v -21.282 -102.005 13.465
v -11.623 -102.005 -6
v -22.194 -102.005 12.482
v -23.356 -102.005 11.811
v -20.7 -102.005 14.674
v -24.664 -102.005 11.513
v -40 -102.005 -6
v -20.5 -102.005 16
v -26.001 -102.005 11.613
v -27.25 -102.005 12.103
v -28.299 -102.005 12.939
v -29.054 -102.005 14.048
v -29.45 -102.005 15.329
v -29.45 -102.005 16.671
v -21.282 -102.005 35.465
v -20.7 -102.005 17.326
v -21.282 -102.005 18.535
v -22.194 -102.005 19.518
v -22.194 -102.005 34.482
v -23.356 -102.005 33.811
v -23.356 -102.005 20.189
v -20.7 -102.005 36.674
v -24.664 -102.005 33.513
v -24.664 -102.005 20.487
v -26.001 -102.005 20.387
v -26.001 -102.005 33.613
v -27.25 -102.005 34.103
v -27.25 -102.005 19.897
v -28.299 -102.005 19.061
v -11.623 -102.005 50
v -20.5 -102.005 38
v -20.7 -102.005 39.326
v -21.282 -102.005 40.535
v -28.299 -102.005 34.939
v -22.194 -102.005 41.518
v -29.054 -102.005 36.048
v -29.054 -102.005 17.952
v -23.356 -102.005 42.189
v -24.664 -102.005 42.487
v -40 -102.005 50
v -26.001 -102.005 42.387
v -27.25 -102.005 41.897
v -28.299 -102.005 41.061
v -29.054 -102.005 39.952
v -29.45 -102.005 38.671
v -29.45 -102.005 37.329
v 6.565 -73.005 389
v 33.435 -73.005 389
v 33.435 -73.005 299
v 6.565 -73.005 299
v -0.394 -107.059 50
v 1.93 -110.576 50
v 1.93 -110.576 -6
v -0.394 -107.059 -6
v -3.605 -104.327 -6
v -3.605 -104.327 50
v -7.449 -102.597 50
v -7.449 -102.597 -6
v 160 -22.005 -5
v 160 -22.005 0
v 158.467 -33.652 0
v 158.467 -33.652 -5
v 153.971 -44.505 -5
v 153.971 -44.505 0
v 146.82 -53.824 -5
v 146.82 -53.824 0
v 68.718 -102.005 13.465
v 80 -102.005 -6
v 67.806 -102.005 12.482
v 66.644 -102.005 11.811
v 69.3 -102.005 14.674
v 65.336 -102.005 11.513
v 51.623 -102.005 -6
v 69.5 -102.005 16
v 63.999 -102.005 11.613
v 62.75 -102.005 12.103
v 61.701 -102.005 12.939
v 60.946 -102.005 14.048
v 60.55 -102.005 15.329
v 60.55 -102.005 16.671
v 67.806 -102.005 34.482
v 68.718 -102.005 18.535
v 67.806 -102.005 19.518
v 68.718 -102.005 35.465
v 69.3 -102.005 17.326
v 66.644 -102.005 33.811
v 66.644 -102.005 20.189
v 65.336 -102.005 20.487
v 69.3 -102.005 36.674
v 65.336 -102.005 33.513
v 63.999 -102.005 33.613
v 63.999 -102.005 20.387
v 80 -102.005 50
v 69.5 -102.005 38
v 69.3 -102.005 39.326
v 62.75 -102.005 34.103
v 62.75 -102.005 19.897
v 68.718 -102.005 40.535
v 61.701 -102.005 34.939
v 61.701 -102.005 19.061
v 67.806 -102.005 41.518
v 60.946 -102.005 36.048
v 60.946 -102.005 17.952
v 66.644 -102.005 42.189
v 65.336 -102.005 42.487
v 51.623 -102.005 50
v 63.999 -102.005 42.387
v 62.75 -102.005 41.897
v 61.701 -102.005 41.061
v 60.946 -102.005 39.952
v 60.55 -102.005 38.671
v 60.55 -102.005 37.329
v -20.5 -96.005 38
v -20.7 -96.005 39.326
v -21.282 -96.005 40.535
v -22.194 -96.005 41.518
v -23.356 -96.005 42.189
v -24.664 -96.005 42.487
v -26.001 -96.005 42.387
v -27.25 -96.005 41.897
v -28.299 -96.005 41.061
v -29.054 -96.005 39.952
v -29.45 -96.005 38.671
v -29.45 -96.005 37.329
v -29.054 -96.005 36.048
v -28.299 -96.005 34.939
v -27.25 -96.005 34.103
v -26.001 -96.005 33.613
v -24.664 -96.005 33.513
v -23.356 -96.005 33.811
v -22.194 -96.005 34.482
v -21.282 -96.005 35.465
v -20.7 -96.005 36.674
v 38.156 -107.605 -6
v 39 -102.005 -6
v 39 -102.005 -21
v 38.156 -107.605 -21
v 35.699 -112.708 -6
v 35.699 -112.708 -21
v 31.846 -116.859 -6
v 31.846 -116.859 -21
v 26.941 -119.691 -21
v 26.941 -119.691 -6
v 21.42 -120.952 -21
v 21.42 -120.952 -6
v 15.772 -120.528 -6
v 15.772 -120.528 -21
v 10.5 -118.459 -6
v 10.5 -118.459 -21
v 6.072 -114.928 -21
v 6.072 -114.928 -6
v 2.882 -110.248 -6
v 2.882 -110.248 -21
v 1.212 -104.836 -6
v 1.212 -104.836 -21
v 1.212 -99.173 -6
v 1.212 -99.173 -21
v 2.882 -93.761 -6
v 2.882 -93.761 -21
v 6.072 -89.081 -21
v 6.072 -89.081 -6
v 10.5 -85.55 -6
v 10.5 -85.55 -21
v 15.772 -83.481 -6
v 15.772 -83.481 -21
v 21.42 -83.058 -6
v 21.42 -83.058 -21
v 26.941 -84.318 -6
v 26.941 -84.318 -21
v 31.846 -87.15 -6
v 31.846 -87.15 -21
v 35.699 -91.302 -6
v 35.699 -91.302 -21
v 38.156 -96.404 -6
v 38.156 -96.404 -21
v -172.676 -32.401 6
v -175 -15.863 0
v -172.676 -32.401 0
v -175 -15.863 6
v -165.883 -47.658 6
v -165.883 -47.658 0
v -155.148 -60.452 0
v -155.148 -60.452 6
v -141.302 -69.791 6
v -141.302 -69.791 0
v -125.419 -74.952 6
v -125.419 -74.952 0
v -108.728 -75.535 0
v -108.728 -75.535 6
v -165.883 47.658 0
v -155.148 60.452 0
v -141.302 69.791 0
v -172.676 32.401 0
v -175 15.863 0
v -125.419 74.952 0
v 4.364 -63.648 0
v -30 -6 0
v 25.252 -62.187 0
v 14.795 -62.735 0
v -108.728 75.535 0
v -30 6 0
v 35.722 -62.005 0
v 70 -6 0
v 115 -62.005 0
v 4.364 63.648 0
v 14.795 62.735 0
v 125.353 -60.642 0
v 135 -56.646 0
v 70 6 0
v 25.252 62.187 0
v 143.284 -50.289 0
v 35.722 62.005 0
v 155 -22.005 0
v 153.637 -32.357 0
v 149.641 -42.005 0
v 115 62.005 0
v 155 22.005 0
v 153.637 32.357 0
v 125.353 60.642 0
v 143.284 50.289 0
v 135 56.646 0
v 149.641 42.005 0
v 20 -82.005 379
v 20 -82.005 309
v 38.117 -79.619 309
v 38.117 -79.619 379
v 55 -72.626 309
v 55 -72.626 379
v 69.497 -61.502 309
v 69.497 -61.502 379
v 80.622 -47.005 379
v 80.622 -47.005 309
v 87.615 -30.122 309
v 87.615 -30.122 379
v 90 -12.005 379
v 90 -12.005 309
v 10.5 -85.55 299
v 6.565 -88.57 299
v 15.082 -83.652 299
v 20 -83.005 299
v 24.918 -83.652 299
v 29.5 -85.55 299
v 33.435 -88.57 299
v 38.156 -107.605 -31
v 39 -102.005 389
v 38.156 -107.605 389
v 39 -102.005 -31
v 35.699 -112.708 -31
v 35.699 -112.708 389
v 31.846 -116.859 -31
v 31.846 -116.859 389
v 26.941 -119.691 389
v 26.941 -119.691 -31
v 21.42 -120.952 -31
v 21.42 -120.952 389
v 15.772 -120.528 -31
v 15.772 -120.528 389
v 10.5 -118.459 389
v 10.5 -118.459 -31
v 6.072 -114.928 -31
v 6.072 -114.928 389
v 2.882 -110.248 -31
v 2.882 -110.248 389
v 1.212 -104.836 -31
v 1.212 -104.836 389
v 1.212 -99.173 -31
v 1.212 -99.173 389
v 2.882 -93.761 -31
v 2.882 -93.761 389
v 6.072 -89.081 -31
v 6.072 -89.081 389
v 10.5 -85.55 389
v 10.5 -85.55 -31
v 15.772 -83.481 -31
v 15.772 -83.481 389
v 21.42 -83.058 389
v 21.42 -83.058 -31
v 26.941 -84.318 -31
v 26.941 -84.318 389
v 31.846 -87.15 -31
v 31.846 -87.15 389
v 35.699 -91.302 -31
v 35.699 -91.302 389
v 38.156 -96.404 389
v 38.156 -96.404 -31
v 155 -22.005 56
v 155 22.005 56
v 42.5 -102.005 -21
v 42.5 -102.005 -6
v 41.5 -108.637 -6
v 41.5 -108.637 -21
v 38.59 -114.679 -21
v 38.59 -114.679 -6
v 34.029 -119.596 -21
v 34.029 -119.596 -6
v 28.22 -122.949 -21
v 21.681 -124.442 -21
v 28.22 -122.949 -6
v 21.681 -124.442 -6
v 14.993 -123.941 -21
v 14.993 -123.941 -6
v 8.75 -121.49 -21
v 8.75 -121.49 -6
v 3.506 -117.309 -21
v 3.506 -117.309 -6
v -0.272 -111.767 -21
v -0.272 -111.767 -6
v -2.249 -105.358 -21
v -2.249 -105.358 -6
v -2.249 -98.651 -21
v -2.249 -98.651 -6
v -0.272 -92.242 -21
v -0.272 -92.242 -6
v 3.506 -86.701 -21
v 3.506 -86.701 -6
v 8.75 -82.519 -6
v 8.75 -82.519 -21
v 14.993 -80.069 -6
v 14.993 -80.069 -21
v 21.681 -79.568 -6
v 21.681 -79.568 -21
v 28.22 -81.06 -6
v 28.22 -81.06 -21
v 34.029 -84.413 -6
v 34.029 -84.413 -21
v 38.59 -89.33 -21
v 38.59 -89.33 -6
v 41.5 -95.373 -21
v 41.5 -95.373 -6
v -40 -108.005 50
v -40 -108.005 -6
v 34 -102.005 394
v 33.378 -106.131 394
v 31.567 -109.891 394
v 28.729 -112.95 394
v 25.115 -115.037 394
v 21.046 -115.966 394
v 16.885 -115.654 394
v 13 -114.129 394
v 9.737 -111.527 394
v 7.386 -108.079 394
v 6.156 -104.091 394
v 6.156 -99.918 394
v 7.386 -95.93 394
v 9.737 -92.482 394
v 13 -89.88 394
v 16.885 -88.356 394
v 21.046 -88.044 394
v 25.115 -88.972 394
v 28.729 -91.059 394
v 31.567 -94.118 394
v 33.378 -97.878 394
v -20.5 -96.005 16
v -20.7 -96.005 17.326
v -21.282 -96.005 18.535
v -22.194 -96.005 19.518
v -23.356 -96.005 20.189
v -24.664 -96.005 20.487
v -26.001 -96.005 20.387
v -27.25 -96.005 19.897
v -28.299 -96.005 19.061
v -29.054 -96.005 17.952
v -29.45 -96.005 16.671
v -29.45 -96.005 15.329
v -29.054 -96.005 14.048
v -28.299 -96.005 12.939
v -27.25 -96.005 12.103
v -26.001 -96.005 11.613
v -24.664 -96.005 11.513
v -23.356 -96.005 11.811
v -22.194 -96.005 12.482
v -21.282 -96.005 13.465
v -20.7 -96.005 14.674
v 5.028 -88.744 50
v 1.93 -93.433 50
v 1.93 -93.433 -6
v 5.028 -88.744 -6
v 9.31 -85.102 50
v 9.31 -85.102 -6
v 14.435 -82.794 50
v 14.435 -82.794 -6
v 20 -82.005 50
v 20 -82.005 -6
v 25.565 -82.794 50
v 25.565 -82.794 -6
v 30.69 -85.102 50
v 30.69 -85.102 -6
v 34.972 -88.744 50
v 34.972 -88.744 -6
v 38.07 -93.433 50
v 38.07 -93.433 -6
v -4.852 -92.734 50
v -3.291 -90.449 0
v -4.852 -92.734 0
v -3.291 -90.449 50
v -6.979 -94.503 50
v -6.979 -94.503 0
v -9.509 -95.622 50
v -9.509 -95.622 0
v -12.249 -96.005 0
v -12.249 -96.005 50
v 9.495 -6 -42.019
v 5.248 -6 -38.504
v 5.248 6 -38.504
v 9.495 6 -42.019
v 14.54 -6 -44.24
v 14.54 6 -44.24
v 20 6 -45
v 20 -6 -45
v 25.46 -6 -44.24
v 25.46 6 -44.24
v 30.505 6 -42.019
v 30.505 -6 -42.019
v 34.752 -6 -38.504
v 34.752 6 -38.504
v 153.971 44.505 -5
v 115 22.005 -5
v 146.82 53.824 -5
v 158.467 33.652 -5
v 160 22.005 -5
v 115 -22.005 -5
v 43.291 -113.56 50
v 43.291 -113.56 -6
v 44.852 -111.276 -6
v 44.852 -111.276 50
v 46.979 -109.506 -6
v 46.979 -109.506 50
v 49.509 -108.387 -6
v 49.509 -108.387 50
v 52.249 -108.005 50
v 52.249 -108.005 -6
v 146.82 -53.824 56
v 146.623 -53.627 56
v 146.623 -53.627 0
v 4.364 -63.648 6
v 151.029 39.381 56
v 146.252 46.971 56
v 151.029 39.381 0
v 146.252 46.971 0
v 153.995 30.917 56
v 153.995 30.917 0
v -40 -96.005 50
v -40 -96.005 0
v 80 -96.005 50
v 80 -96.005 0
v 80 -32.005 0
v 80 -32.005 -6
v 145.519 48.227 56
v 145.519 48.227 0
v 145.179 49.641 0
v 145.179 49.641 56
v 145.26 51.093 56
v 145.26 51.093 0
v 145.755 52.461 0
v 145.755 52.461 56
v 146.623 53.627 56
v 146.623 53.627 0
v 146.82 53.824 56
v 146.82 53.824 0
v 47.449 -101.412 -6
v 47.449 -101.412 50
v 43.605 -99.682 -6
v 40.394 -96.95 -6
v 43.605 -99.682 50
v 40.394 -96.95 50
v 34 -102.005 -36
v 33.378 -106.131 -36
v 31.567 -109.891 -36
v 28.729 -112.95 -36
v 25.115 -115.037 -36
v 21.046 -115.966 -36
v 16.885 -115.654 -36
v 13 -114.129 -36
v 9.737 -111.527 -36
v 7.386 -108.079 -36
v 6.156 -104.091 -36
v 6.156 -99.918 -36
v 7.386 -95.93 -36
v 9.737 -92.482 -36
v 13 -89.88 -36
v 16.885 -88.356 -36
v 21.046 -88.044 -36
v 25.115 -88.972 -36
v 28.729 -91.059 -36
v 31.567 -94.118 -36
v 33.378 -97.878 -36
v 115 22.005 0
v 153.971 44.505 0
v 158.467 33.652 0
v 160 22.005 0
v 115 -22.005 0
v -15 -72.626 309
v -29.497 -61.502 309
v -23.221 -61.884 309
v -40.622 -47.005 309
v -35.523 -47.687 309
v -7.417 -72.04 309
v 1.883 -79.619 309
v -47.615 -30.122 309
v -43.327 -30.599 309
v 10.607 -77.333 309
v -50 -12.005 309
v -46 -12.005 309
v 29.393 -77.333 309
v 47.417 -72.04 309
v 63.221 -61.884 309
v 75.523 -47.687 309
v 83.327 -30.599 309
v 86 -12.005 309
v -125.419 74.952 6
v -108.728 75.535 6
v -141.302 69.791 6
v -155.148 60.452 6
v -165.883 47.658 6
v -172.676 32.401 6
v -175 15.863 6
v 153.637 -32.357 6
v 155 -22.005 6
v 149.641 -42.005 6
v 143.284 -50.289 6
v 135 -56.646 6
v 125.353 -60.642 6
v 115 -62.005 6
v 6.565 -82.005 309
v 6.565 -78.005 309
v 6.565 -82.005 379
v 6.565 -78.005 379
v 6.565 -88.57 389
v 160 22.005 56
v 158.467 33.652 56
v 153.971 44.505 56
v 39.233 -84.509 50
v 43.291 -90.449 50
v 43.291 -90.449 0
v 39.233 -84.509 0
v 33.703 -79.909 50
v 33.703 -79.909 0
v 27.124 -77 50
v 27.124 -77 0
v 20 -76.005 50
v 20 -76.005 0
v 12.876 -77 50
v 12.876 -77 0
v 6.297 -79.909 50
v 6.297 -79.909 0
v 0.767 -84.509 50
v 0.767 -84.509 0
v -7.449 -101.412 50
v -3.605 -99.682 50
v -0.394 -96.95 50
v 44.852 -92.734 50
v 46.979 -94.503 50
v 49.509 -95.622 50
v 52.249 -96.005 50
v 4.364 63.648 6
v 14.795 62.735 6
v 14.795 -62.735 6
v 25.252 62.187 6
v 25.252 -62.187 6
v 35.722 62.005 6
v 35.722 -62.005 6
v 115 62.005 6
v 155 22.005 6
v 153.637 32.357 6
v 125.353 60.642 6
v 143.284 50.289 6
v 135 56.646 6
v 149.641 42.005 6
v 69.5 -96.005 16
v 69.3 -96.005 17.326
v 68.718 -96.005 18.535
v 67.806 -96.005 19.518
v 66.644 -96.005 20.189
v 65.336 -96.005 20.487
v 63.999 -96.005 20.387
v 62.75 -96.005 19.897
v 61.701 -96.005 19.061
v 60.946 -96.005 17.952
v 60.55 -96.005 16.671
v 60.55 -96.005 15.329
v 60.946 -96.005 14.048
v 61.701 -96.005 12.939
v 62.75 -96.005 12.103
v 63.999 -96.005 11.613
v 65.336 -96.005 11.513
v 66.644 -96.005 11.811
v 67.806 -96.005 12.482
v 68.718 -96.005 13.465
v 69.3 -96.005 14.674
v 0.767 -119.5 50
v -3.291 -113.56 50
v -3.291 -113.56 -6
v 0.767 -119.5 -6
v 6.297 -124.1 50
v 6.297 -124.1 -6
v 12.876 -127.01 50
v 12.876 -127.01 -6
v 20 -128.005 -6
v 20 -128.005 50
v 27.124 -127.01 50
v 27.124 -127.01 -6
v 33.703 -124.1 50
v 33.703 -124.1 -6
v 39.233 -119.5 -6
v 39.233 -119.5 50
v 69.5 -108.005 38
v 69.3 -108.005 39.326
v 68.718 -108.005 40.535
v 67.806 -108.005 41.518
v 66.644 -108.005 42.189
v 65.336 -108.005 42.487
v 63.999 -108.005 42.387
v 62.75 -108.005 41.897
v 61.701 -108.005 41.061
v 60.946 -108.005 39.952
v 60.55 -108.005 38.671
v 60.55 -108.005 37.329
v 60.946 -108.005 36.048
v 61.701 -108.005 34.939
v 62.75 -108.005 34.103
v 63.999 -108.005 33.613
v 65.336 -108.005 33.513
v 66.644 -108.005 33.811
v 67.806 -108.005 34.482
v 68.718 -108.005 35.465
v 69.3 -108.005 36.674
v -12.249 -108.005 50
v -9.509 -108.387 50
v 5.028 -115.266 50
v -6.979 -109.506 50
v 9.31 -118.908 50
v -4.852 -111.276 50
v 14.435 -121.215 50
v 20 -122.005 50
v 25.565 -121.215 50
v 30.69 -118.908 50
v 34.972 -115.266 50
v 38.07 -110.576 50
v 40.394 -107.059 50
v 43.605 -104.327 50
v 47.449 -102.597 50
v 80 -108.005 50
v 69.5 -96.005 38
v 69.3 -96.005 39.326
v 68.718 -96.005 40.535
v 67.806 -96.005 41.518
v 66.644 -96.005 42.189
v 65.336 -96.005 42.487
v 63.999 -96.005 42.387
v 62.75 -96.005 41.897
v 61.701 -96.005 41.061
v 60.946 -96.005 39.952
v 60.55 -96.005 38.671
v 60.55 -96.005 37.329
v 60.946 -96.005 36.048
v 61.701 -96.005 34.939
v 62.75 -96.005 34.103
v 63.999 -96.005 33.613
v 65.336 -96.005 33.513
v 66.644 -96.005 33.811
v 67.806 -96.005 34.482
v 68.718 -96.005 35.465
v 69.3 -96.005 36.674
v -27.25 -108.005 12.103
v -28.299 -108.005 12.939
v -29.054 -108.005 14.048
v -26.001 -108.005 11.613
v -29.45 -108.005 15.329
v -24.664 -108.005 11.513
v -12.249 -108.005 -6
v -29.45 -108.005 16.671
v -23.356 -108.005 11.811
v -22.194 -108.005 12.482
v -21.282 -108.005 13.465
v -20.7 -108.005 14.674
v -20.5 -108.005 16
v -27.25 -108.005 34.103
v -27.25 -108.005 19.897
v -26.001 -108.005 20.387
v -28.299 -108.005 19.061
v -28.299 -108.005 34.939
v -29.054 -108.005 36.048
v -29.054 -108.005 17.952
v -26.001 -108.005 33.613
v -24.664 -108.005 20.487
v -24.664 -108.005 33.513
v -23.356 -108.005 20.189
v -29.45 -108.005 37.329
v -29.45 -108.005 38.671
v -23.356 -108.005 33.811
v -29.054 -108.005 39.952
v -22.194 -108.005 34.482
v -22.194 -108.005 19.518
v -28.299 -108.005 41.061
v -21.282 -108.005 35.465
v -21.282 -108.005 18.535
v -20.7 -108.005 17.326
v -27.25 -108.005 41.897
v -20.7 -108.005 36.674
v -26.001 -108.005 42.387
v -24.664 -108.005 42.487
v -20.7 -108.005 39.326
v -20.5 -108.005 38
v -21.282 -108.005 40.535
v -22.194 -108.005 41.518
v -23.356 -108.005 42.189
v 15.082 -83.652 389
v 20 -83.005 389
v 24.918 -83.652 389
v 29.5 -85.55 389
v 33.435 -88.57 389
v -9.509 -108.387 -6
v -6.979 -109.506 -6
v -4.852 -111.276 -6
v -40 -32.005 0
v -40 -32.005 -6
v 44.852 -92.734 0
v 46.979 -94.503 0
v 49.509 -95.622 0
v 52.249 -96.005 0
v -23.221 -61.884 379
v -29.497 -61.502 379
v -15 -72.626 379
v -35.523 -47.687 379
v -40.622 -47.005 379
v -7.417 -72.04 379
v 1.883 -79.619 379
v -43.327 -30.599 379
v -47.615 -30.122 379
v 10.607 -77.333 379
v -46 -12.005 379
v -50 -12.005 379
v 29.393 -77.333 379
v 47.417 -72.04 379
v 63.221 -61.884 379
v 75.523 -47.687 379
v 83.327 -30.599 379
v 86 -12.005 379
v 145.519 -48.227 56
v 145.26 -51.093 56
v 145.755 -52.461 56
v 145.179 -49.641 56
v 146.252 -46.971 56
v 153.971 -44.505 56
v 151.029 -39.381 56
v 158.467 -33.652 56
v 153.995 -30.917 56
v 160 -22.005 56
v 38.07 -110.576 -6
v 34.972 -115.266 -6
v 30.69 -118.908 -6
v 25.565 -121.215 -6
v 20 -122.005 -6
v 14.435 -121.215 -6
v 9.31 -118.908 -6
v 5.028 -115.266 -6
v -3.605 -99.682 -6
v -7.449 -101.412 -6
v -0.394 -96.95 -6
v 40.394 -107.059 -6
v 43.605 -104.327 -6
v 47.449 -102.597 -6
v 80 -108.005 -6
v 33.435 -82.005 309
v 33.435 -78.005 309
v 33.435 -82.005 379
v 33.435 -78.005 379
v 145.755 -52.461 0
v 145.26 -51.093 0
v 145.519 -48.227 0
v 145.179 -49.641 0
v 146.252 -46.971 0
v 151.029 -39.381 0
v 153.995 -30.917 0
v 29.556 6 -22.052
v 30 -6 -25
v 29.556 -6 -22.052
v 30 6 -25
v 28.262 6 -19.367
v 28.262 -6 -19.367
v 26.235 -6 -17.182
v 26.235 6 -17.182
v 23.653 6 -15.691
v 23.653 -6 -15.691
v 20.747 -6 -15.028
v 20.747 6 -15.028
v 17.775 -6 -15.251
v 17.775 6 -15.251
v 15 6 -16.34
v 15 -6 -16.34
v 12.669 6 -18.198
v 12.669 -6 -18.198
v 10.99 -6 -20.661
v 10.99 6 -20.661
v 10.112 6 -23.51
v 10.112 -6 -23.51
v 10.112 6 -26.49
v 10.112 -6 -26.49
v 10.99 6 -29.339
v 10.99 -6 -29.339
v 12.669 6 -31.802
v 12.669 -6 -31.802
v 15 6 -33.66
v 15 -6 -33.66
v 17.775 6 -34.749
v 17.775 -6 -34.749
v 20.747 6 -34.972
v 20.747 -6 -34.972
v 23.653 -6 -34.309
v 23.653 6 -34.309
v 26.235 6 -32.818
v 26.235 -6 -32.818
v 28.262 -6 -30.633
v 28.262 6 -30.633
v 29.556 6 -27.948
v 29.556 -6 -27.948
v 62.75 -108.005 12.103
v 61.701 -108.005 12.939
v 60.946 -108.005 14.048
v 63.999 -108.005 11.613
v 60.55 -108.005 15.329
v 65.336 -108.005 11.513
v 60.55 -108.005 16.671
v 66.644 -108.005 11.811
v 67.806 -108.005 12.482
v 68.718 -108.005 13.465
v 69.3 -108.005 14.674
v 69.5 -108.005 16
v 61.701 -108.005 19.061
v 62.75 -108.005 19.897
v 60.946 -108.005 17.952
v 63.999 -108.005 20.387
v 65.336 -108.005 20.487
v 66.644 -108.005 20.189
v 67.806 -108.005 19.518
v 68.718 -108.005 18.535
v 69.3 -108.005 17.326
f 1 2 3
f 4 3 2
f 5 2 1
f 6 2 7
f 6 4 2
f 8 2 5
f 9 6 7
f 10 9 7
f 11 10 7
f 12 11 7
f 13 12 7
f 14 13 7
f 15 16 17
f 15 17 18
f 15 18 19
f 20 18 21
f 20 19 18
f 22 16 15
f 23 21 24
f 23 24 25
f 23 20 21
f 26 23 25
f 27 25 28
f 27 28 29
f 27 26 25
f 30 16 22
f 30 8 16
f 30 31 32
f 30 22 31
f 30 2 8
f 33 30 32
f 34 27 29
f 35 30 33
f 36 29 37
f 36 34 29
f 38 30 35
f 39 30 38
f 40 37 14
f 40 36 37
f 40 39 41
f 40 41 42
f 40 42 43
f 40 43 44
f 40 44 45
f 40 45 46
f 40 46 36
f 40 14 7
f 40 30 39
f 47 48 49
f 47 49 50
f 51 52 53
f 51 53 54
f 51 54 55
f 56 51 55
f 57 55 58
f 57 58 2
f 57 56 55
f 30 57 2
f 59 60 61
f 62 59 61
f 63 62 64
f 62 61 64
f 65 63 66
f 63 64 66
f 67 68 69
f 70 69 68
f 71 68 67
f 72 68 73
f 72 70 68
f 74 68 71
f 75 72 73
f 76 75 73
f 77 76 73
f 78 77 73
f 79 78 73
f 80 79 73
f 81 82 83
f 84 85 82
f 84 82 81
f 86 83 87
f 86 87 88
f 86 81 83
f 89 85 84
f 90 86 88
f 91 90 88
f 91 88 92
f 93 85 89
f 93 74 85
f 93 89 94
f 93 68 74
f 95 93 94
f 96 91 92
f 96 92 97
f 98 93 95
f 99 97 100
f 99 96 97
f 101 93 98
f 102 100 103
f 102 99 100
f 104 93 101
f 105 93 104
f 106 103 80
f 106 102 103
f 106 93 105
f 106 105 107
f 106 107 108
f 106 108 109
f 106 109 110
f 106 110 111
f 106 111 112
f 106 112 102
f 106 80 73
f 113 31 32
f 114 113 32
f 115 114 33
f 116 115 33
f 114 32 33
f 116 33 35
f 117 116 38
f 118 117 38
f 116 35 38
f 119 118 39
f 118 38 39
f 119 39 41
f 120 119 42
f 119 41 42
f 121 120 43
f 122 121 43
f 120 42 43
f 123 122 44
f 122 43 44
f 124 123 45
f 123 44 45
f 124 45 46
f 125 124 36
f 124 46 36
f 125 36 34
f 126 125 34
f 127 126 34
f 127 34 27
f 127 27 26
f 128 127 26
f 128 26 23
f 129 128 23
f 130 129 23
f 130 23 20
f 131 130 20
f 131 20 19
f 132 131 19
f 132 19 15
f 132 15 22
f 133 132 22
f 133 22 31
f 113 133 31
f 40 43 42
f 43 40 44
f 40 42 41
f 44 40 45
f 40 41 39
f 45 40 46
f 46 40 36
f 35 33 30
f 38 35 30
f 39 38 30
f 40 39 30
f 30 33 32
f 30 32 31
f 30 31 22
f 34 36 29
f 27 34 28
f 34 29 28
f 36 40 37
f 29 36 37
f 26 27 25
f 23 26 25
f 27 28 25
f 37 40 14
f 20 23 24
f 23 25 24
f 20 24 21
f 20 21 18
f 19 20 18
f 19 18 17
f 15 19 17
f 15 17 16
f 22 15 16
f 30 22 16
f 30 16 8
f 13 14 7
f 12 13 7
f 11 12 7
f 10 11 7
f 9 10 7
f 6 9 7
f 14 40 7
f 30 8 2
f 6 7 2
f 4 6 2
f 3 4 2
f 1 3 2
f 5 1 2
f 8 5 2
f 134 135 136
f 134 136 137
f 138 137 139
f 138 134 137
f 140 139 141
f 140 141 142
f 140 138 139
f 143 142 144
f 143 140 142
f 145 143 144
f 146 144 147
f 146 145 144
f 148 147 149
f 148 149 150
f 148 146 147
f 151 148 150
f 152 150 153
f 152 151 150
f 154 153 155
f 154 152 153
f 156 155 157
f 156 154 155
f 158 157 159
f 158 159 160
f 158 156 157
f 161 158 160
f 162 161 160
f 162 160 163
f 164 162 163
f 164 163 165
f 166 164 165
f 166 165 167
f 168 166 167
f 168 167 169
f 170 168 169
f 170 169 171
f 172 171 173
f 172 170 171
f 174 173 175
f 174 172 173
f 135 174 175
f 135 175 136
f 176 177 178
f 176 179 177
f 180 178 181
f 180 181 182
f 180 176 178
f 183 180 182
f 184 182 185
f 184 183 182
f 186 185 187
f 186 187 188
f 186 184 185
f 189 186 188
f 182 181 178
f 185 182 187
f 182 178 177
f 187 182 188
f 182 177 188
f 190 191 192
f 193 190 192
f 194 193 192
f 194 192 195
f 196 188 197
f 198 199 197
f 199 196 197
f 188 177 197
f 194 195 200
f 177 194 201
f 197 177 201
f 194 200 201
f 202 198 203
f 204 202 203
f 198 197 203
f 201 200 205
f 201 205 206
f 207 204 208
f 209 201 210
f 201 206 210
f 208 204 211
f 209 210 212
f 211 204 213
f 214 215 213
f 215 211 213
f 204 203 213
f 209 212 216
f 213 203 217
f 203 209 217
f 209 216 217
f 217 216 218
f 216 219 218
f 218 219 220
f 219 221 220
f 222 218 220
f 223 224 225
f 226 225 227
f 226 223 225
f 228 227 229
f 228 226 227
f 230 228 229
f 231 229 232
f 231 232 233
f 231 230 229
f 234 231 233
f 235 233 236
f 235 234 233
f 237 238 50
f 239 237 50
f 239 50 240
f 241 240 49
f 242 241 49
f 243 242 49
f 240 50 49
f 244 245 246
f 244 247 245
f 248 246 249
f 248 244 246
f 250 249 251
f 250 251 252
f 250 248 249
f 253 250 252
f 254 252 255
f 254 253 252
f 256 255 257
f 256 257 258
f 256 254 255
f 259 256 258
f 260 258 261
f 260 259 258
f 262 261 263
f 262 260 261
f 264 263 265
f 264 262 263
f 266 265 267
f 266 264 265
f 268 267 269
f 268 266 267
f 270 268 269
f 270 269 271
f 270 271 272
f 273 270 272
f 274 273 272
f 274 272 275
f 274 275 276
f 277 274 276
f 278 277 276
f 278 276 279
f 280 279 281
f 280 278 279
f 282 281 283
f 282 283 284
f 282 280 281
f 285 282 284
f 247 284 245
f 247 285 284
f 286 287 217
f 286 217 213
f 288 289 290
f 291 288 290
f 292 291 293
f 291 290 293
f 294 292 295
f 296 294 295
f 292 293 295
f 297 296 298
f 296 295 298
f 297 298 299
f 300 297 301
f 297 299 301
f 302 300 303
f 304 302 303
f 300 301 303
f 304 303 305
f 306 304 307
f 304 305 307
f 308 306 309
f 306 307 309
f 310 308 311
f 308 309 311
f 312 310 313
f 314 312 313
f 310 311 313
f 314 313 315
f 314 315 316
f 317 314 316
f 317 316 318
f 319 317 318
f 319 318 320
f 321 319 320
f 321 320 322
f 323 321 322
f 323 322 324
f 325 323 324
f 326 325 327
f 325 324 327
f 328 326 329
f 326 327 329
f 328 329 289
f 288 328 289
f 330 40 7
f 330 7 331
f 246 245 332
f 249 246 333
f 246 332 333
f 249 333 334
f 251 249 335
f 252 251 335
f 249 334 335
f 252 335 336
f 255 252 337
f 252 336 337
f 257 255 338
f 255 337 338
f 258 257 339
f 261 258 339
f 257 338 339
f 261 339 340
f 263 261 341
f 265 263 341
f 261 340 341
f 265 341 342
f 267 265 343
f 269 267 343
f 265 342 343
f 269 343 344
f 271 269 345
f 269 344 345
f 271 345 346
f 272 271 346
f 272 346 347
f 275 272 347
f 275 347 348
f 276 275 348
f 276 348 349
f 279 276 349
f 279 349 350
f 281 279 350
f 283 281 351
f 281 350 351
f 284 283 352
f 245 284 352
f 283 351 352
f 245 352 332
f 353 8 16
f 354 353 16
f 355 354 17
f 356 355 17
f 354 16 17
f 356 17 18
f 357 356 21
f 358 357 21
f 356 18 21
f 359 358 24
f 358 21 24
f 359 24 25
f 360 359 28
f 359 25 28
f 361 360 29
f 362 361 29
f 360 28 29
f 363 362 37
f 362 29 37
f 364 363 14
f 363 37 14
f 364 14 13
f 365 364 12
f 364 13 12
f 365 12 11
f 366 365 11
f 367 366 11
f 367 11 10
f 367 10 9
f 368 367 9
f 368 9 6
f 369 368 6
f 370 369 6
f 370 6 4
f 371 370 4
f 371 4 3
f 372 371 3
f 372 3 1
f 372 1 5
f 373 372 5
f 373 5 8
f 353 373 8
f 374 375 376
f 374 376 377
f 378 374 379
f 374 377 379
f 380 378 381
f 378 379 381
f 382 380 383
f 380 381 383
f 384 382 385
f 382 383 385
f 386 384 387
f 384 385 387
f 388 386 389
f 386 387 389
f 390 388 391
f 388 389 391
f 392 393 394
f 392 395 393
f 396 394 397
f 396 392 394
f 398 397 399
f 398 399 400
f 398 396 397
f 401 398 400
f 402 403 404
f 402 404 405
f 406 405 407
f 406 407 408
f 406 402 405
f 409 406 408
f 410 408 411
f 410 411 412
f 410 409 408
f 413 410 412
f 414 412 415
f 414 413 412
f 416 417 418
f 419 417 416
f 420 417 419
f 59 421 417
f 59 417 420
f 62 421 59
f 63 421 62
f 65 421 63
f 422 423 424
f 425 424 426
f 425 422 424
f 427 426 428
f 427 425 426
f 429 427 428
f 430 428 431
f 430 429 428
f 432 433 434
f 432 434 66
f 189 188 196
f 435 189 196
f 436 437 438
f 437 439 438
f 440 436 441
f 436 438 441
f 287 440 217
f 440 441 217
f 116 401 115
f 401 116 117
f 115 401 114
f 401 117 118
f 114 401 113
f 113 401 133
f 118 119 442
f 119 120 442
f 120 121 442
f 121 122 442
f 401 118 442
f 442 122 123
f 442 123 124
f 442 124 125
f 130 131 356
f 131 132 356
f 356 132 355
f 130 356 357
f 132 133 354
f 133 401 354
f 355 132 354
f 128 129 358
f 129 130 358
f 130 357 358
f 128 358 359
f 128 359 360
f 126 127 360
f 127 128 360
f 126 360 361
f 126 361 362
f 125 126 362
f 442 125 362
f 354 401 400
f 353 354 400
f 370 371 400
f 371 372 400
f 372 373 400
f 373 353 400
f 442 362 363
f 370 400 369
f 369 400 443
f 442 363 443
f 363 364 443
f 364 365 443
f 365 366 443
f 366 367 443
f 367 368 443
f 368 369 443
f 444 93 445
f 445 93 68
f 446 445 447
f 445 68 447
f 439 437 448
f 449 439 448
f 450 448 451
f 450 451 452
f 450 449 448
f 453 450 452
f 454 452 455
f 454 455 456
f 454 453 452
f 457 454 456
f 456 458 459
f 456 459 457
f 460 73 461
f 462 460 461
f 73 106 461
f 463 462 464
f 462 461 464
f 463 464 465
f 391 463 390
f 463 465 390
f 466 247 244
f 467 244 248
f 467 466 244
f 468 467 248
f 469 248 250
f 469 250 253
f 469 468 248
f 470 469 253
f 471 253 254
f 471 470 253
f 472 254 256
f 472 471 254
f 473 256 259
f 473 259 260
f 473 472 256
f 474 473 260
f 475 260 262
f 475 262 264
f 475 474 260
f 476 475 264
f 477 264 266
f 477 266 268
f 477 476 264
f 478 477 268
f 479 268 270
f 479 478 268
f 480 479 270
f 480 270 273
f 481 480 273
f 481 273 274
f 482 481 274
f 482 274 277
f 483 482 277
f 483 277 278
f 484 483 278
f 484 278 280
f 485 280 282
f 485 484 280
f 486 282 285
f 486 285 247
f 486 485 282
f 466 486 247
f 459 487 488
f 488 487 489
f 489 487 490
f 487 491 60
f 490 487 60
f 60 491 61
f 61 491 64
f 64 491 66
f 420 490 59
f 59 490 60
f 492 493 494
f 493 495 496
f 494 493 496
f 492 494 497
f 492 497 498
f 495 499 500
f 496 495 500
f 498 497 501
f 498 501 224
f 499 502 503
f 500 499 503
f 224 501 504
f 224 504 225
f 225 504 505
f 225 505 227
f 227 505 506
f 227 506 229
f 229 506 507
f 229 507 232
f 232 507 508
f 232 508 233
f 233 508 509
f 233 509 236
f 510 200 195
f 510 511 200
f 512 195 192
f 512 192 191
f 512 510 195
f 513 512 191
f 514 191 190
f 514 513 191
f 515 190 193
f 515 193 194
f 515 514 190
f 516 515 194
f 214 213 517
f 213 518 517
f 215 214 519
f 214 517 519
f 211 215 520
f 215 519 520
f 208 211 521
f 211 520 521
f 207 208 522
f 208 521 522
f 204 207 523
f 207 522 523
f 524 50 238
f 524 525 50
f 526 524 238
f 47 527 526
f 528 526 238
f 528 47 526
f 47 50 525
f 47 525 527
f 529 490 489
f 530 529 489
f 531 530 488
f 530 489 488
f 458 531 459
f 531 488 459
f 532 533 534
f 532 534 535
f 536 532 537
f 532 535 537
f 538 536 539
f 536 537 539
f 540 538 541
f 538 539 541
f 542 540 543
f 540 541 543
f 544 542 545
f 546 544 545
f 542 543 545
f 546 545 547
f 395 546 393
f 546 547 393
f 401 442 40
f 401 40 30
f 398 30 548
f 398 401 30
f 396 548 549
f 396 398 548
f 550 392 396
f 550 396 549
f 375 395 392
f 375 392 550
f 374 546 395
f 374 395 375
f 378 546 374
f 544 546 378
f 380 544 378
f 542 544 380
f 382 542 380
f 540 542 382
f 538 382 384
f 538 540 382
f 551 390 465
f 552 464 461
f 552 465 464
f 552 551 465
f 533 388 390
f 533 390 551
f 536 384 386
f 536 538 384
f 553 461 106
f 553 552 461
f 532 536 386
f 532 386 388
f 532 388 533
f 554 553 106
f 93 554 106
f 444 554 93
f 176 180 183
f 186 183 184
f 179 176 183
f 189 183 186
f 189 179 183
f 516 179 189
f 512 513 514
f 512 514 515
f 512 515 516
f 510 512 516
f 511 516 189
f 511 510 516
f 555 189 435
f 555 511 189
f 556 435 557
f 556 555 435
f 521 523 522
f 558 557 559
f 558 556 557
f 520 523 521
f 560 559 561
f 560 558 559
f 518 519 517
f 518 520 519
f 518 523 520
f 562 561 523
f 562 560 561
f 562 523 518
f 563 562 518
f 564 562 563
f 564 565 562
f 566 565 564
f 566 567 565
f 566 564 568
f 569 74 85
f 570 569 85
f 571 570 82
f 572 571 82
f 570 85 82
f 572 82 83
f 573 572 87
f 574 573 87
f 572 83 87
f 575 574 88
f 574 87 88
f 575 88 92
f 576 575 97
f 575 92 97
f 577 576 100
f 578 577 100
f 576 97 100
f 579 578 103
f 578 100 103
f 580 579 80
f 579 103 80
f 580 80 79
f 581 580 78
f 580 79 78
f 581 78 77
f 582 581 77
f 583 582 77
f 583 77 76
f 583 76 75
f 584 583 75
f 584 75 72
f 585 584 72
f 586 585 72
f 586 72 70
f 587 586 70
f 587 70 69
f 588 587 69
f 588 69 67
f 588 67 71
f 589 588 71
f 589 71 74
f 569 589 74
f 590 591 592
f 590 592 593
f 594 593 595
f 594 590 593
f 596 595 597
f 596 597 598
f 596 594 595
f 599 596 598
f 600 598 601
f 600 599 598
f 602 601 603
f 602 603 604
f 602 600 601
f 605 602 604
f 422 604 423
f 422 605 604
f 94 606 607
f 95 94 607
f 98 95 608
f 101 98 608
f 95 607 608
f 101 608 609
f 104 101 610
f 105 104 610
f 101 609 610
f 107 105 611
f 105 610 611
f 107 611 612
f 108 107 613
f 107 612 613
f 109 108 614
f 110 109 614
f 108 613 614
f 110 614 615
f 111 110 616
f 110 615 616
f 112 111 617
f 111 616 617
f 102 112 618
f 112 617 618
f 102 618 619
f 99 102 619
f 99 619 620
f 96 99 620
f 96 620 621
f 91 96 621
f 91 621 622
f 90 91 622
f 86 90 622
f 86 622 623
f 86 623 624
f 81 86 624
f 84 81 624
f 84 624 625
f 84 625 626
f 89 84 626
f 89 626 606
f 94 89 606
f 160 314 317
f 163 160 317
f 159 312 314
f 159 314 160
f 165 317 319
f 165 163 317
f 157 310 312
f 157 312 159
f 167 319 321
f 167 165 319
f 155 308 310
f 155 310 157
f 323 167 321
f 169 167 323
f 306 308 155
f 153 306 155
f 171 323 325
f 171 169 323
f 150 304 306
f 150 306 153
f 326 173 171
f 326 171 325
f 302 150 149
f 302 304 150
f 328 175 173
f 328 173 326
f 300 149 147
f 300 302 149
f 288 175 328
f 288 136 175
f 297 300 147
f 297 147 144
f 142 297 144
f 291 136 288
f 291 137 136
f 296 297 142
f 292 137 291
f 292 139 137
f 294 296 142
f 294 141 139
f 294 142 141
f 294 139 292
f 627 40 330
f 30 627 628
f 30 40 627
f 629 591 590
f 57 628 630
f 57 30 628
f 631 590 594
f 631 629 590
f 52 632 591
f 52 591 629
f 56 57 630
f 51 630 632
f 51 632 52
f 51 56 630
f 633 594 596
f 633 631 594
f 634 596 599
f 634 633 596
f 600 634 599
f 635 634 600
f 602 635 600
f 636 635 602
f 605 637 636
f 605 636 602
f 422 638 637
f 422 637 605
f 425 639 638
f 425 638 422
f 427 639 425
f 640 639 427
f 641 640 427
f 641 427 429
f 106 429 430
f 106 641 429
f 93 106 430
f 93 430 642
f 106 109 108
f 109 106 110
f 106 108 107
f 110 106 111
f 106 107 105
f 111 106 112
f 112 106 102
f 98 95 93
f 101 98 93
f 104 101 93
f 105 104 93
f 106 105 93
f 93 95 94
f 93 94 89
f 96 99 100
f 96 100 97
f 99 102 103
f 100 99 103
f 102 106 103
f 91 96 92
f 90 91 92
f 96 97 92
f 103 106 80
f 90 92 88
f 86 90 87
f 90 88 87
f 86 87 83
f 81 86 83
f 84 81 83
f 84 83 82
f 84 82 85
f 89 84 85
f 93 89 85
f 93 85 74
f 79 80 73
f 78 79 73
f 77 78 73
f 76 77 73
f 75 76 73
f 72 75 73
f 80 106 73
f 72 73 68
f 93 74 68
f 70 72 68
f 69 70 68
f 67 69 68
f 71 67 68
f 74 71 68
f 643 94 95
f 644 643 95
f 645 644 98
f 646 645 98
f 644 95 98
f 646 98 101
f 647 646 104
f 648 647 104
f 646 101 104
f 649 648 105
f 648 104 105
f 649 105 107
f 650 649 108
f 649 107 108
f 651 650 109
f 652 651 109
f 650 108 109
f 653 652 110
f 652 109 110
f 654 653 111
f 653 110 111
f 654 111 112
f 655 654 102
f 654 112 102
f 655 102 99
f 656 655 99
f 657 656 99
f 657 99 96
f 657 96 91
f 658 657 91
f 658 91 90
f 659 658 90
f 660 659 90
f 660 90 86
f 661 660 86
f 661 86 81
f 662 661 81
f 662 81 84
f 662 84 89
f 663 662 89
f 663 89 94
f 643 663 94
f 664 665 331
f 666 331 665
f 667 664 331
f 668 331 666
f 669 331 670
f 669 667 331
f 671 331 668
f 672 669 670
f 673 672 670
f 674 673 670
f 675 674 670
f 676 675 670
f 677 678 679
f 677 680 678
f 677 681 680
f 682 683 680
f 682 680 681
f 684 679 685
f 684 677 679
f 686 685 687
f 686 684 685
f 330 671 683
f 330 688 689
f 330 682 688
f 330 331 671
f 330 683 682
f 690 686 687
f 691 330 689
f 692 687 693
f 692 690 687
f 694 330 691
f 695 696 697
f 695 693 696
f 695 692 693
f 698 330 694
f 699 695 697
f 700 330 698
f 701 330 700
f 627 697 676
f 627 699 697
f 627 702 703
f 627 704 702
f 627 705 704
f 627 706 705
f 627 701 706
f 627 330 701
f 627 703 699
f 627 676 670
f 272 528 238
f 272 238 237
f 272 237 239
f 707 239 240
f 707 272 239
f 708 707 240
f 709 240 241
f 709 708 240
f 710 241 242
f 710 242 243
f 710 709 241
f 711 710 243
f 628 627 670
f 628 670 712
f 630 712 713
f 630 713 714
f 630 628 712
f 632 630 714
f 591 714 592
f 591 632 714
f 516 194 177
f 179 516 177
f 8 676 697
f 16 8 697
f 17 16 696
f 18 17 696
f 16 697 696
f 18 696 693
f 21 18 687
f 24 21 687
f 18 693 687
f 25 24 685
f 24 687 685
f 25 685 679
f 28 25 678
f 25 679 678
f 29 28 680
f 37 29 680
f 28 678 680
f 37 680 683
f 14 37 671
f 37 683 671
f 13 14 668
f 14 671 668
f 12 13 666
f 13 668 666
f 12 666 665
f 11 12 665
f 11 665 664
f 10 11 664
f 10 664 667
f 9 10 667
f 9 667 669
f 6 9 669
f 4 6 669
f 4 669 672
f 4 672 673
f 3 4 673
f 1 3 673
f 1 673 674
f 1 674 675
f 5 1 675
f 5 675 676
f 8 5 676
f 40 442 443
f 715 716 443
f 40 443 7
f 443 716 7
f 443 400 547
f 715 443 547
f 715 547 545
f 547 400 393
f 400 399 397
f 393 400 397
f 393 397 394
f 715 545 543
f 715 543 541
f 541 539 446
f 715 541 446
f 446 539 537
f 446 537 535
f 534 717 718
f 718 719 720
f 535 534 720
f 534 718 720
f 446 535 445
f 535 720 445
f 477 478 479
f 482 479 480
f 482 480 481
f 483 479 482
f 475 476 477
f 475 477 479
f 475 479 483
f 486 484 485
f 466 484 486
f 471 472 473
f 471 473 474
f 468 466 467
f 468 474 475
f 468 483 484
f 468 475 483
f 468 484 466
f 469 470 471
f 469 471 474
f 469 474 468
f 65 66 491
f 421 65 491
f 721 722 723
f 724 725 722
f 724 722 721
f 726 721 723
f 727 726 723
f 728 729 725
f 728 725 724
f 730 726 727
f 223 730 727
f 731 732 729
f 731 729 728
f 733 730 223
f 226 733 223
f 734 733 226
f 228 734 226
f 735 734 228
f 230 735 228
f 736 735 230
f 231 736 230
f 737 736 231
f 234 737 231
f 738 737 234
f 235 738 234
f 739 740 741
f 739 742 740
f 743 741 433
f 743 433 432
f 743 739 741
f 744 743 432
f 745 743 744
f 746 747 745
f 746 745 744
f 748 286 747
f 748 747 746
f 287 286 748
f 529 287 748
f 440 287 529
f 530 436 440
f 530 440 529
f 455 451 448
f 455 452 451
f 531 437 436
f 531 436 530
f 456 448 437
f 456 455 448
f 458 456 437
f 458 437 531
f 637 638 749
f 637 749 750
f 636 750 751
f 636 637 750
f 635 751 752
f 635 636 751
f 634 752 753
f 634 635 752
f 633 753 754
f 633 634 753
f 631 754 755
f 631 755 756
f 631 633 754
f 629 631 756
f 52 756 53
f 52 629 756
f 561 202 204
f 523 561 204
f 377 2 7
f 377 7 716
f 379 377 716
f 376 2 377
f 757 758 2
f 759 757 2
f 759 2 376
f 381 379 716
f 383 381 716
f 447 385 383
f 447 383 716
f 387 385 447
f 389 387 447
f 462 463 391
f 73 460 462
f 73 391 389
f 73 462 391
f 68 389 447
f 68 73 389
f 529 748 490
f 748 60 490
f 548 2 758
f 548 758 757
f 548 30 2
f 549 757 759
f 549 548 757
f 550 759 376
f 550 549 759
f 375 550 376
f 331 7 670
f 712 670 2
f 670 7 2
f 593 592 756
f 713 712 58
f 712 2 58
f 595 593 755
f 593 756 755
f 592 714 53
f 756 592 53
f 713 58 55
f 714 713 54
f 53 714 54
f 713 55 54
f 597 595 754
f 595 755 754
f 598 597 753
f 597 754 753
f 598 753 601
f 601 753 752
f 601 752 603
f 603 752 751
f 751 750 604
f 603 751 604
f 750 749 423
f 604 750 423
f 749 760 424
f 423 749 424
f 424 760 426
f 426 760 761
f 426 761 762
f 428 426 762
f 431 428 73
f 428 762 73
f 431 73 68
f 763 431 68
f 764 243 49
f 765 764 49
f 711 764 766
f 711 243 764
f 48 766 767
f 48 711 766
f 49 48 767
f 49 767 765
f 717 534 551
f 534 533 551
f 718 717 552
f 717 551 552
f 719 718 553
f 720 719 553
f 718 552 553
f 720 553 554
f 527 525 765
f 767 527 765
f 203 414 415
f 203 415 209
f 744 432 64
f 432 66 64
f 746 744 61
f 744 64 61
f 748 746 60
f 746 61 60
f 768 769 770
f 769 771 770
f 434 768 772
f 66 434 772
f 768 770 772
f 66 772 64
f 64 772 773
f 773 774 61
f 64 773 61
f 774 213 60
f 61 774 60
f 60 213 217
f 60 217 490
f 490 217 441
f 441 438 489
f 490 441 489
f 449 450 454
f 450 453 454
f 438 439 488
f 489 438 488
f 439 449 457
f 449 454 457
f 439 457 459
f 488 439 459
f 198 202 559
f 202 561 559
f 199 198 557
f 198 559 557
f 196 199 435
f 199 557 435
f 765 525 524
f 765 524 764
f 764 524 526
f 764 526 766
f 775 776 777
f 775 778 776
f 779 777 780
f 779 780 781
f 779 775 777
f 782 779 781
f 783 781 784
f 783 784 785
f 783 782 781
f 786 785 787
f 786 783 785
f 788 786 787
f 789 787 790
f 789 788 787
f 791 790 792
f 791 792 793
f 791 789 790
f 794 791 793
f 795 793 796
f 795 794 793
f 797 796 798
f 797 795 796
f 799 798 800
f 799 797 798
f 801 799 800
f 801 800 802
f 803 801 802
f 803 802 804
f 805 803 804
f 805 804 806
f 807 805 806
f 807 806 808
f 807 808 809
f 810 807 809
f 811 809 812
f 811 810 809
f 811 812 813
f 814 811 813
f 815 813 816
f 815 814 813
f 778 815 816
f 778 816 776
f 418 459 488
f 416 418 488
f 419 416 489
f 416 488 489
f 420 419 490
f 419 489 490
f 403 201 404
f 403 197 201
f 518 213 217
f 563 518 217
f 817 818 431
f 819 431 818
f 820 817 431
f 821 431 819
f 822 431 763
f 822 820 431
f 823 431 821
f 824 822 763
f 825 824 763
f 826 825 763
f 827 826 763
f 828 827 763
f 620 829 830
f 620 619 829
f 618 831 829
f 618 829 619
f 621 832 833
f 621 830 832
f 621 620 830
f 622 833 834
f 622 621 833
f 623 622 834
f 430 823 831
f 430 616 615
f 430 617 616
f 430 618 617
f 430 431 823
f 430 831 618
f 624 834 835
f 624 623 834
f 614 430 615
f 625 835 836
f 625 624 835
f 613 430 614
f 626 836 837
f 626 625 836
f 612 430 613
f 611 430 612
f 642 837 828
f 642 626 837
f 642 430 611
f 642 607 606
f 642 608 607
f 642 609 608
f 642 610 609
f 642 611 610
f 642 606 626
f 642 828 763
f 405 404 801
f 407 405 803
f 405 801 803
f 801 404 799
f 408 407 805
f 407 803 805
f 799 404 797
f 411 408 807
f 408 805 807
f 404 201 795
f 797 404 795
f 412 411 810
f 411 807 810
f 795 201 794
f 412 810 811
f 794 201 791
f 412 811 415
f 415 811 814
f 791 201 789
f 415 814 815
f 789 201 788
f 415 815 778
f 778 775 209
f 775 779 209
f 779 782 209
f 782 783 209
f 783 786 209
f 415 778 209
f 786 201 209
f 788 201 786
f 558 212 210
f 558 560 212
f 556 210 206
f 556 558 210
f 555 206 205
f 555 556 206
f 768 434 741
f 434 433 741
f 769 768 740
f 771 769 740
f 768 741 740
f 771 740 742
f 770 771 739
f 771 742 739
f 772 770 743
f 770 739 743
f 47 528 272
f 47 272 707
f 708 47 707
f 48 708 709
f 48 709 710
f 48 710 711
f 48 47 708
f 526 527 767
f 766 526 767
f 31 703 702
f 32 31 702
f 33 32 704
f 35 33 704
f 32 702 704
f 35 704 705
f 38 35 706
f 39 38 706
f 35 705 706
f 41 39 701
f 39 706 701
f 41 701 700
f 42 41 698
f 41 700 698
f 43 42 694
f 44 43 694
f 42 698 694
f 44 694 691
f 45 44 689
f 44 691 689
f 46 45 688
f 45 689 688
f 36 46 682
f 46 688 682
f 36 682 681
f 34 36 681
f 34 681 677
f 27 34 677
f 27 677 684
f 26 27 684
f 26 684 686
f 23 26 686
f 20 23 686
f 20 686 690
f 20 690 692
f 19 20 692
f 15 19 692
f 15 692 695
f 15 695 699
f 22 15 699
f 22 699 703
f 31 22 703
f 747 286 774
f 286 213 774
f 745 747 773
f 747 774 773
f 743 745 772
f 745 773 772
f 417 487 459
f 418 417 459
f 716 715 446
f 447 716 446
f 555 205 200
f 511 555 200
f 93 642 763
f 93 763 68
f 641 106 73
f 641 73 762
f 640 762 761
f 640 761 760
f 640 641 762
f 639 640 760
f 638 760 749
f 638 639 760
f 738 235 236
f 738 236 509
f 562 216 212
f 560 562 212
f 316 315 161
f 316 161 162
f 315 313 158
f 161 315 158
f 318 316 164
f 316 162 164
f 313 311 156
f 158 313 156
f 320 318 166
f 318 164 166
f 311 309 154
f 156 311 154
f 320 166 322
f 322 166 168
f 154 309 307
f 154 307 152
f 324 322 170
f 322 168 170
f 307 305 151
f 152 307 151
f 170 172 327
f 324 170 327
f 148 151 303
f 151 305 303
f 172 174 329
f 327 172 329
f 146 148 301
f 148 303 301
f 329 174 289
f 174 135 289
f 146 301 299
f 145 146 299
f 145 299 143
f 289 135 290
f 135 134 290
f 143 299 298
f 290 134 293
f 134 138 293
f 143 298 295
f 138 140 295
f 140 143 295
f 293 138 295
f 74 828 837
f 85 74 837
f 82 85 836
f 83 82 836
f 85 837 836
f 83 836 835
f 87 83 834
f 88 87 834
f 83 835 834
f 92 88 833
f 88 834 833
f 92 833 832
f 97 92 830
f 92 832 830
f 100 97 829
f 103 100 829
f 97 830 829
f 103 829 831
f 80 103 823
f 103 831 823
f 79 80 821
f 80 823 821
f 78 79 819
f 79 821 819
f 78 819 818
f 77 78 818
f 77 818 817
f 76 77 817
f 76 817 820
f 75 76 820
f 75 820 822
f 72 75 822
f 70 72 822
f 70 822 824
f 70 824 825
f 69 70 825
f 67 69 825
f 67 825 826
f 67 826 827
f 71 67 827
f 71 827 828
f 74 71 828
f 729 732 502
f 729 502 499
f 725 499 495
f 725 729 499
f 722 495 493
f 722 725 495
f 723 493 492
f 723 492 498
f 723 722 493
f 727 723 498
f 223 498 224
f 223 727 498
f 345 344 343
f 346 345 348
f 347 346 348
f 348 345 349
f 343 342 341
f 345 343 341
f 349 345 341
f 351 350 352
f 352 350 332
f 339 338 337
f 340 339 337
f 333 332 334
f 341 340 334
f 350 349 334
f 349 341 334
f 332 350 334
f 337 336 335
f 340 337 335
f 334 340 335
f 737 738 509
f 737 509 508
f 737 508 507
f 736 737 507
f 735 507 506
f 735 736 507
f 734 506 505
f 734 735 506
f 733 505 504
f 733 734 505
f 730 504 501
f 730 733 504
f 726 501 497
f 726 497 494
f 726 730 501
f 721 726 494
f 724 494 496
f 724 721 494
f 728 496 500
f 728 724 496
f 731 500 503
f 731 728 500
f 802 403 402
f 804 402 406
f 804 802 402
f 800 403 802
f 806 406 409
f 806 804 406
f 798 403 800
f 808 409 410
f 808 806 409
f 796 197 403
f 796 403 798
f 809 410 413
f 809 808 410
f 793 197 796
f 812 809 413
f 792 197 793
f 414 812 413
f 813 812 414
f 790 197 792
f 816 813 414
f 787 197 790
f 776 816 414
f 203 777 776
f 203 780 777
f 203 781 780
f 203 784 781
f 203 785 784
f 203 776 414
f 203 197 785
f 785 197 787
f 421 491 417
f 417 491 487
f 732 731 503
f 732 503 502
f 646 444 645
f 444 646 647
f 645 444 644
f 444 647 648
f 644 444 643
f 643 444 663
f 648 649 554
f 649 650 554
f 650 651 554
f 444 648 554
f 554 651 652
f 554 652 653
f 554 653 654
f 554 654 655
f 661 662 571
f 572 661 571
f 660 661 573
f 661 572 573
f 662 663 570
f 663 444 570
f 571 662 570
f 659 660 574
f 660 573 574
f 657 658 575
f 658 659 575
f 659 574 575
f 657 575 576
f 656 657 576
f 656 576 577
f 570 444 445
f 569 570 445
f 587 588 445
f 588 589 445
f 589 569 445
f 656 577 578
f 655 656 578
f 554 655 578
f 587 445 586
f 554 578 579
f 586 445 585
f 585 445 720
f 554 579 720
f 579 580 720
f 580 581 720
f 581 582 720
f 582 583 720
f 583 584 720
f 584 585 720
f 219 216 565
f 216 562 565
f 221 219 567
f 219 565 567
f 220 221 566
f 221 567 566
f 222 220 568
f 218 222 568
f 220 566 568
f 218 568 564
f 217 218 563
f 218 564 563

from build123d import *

# Parameters (mm, degrees)
F1_DEPTH  = 6
F2_R      = 60
F3_R      = 40
F4_R      = 300
F5_R      = 10
F6_DEPTH  = 6
F8_DEPTH  = 6
F9_DEPTH  = 50
F10_R     = 5
F12_DEPTH = 5
F14_DEPTH = 6
F16_DEPTH = 50
F17_R     = 10
F18_R     = 15
F20_DEPTH = 56
F21_R     = 4.5
F22_DEPTH = 25
F23_R     = 4.5
F24_DEPTH = 25
F25_R     = 19
F26_DEPTH = 400
F27_DEPTH = 30
F28_SIZE  = 5
F29_R     = 22.5
F29_R_2   = 19
F30_DEPTH = 15
F31_SIZE  = 5
F34_DEPTH = 90
F36_W     = 26.8700576851
F36_H     = 4
F37_DEPTH = 70
F39_DEPTH = 70


with BuildPart() as f1:
    # F0 (on Top) → F1 (new body)
    with BuildSketch(Plane.XY):
        Polygon((20, 62.0046741232), (-175, 82.5), (-175, -82.5), (20, -62.0046741232), (155, -62.0046741232), (155, 62.0046741232), align=None)
    extrude(amount=F1_DEPTH)

    # F2
    f2_edges = [f1.edges().sort_by_distance(p)[0] for p in [
        (-175, -82.5, 3),
        (-175, 82.5, 3),
    ]]
    fillet(f2_edges, radius=F2_R)

    # F3
    f3_edges = [f1.edges().sort_by_distance(p)[0] for p in [
        (155, 62.004674, 3),
        (155, -62.004674, 3),
    ]]
    fillet(f3_edges, radius=F3_R)

    # F4
    f4_edges = [f1.edges().sort_by_distance(p)[0] for p in [
        (20, -62.004674, 3),
        (20, 62.004674, 3),
    ]]
    fillet(f4_edges, radius=F4_R)

    # F5 (on Front) → F6 (join, symmetric)
    with BuildSketch(Plane.XZ):
        with BuildLine():
            Line((-30, 0), (5.2477547929, -38.5044904143))
            ThreePointArc((5.2477547929, -38.5044904143), (20, -45), (34.7522452071, -38.5044904143))
            Line((34.7522452071, -38.5044904143), (70, 0))
            Line((70, 0), (-30, 0))
        make_face()
        with Locations((20, -25)):
            Circle(F5_R, mode=Mode.SUBTRACT)
    extrude(amount=F6_DEPTH, both=True)

    # F23 (on face) → F24 (cut)
    with BuildSketch(Plane(origin=(0, -96.0046741232, 0), x_dir=(-1, 0, 0), z_dir=(0, 1, 0))):
        with Locations((25, 38)):
            Circle(F23_R)
        with Locations((25, 16)):
            Circle(F23_R)
        with Locations((-65, 38)):
            Circle(F23_R)
        with Locations((-65, 16)):
            Circle(F23_R)
    extrude(amount=-F24_DEPTH, mode=Mode.SUBTRACT)


with BuildPart() as f8:
    # F7 (on face) → F8 (new body)
    with BuildSketch(Plane.XY.offset(6)):
        with BuildLine():
            ThreePointArc((143.2842712475, 50.2889453707), (151.9551813005, 37.3120114178), (155, 22.0046741232))
            Line((155, 22.0046741232), (155, -22.0046741232))
            ThreePointArc((155, -22.0046741232), (151.9551813005, -37.3120114178), (143.2842712475, -50.2889453707))
            Line((143.2842712475, -50.2889453707), (146.8198051534, -53.8244792766))
            ThreePointArc((146.8198051534, -53.8244792766), (156.574578963, -39.2254285796), (160, -22.0046741232))
            Line((160, -22.0046741232), (160, 22.0046741232))
            ThreePointArc((160, 22.0046741232), (156.574578963, 39.2254285796), (146.8198051534, 53.8244792766))
            Line((146.8198051534, 53.8244792766), (143.2842712475, 50.2889453707))
        make_face()
    extrude(amount=-F8_DEPTH)

    # F7 (on face) → F9 (join)
    with BuildSketch(Plane.XY.offset(6)):
        with BuildLine():
            ThreePointArc((143.2842712475, 50.2889453707), (151.9551813005, 37.3120114178), (155, 22.0046741232))
            Line((155, 22.0046741232), (155, -22.0046741232))
            ThreePointArc((155, -22.0046741232), (151.9551813005, -37.3120114178), (143.2842712475, -50.2889453707))
            Line((143.2842712475, -50.2889453707), (146.8198051534, -53.8244792766))
            ThreePointArc((146.8198051534, -53.8244792766), (156.574578963, -39.2254285796), (160, -22.0046741232))
            Line((160, -22.0046741232), (160, 22.0046741232))
            ThreePointArc((160, 22.0046741232), (156.574578963, 39.2254285796), (146.8198051534, 53.8244792766))
            Line((146.8198051534, 53.8244792766), (143.2842712475, 50.2889453707))
        make_face()
    extrude(amount=F9_DEPTH)

    # F10
    f10_edges = [f8.edges().sort_by_distance(p)[0] for p in [
        (143.284271, -50.288945, 28),
        (143.284271, 50.288945, 28),
    ]]
    fillet(f10_edges, radius=F10_R)


with BuildPart() as f12:
    # F11 (on face) → F12 (new body)
    with BuildSketch(Plane(origin=(0, 0, 0), x_dir=(1, 0, 0), z_dir=(0, 0, -1))):
        with BuildLine():
            ThreePointArc((160, 22.0046741232), (156.574578963, 39.2254285796), (146.8198051534, 53.8244792766))
            Line((146.8198051534, 53.8244792766), (115, 22.0046741232))
            Line((115, 22.0046741232), (115, -22.0046741232))
            Line((115, -22.0046741232), (146.8198051534, -53.8244792766))
            ThreePointArc((146.8198051534, -53.8244792766), (156.574578963, -39.2254285796), (160, -22.0046741232))
            Line((160, -22.0046741232), (160, 22.0046741232))
        make_face()
    extrude(amount=F12_DEPTH)


with BuildPart() as f14:
    # F13 (on face) → F14 (new body)
    with BuildSketch(Plane(origin=(0, 0, 0), x_dir=(1, 0, 0), z_dir=(0, 0, -1))):
        with BuildLine():
            Line((0, 102.0046741232), (-40, 102.0046741232))
            Line((-40, 102.0046741232), (-40, 68.3109282391))
            Line((-40, 68.3109282391), (4.3637948046, 63.6481055127))
            ThreePointArc((4.3637948046, 63.6481055127), (20.021546912, 62.4158136968), (35.7223337849, 62.0046741232))
            Line((35.7223337849, 62.0046741232), (80, 62.0046741232))
            Line((80, 62.0046741232), (80, 102.0046741232))
            Line((80, 102.0046741232), (40, 102.0046741232))
            ThreePointArc((40, 102.0046741232), (20, 82.0046741232), (0, 102.0046741232))
        make_face()
        with BuildLine():
            Line((4.3637948046, 63.6481055127), (-40, 68.3109282391))
            Line((-40, 68.3109282391), (-40, 32.0046741232))
            Line((-40, 32.0046741232), (80, 32.0046741232))
            Line((80, 32.0046741232), (80, 62.0046741232))
            Line((80, 62.0046741232), (35.7223337849, 62.0046741232))
            ThreePointArc((35.7223337849, 62.0046741232), (20.021546912, 62.4158136968), (4.3637948046, 63.6481055127))
        make_face()
    extrude(amount=F14_DEPTH)

    # F15 (on face) → F16 (join)
    with BuildSketch(Plane.XY):
        with BuildLine():
            Line((-40, -102.0046741232), (0, -102.0046741232))
            ThreePointArc((0, -102.0046741232), (20, -82.0046741232), (40, -102.0046741232))
            Line((40, -102.0046741232), (80, -102.0046741232))
            Line((80, -102.0046741232), (80, -96.0046741232))
            Line((80, -96.0046741232), (45.2982212813, -96.0046741232))
            ThreePointArc((45.2982212813, -96.0046741232), (20, -76.0046741232), (-5.2982212813, -96.0046741232))
            Line((-5.2982212813, -96.0046741232), (-40, -96.0046741232))
            Line((-40, -96.0046741232), (-40, -102.0046741232))
        make_face()
    extrude(amount=F16_DEPTH)

    # F17
    f17_edges = [f14.edges().sort_by_distance(p)[0] for p in [
        (-5.298221, -96.004674, 25),
        (45.298221, -96.004674, 25),
    ]]
    fillet(f17_edges, radius=F17_R)

    # F18
    f18_edges = [f14.edges().sort_by_distance(p)[0] for p in [
        (40, -102.004674, 22),
        (0, -102.004674, 22),
    ]]
    fillet(f18_edges, radius=F18_R)


with BuildPart() as f20:
    # F19 (on face) → F20 (new body)
    with BuildSketch(Plane.XY.offset(50)):
        with BuildLine():
            Line((-11.6227766017, -102.0046741232), (-40, -102.0046741232))
            Line((-40, -102.0046741232), (-40, -108.0046741232))
            Line((-40, -108.0046741232), (-12.2490309932, -108.0046741232))
            ThreePointArc((-12.2490309932, -108.0046741232), (-6.9785682262, -109.5063082672), (-3.2909668284, -113.5602296787))
            ThreePointArc((-3.2909668284, -113.5602296787), (20, -128.0046741232), (43.2909668284, -113.5602296787))
            ThreePointArc((43.2909668284, -113.5602296787), (46.9785682262, -109.5063082672), (52.2490309932, -108.0046741232))
            Line((52.2490309932, -108.0046741232), (80, -108.0046741232))
            Line((80, -108.0046741232), (80, -102.0046741232))
            Line((80, -102.0046741232), (51.6227766017, -102.0046741232))
            ThreePointArc((51.6227766017, -102.0046741232), (43.6049393443, -104.3273603023), (38.0701580581, -110.5761026946))
            ThreePointArc((38.0701580581, -110.5761026946), (20, -122.0046741232), (1.9298419419, -110.5761026946))
            ThreePointArc((1.9298419419, -110.5761026946), (-3.6049393443, -104.3273603023), (-11.6227766017, -102.0046741232))
        make_face()
    extrude(amount=-F20_DEPTH)


with BuildPart() as f22_tool:
    # F21 (on face) → F22 (new body)
    with BuildSketch(Plane.XZ.offset(108.0046741232)):
        with Locations((-25, 38)):
            Circle(F21_R)
        with Locations((-25, 16)):
            Circle(F21_R)
        with Locations((65, 38)):
            Circle(F21_R)
        with Locations((65, 16)):
            Circle(F21_R)
    extrude(amount=-F22_DEPTH)


with BuildPart() as f14_1:
    add(f14.part)

    # F22: cut by f22_tool
    add(f22_tool.part, mode=Mode.SUBTRACT)


with BuildPart() as f20_1:
    add(f20.part)

    # F22: cut by f22_tool
    add(f22_tool.part, mode=Mode.SUBTRACT)


with BuildPart() as f26:
    # F25 (on face) → F26 (new body)
    with BuildSketch(Plane(origin=(0, 0, -6), x_dir=(1, 0, 0), z_dir=(0, 0, -1))):
        with Locations((20, 102.0046741232)):
            Circle(F25_R)
    extrude(amount=-F26_DEPTH)

    # F27 (add): a face of the model
    f27_faces = [f26.faces().sort_by_distance(p)[0] for p in [
        (20, -102.0046741232, -6),
    ]]
    extrude(f27_faces, amount=F27_DEPTH)

    # F28
    f28_edges = [f26.edges().sort_by_distance(p)[0] for p in [
        (1, -102.004674, -36),
    ]]
    chamfer(f28_edges, length=F28_SIZE)

    # F31
    f31_edges = [f26.edges().sort_by_distance(p)[0] for p in [
        (1, -102.004674, 394),
    ]]
    chamfer(f31_edges, length=F31_SIZE)


with BuildPart() as f30:
    # F29 (on face) → F30 (new body)
    with BuildSketch(Plane(origin=(0, 0, -6), x_dir=(1, 0, 0), z_dir=(0, 0, -1))):
        with Locations((20, 102.0046741232)):
            Circle(F29_R)
        with Locations((20, 102.0046741232)):
            Circle(F29_R_2, mode=Mode.SUBTRACT)
    extrude(amount=F30_DEPTH)


with BuildPart() as f34:
    # F33 (on offset) → F34 (new body)
    with BuildSketch(Plane.XY.offset(389)):
        with BuildLine():
            Line((33.4350288425, -88.5696452806), (33.4350288425, -73.0046741232))
            Line((33.4350288425, -73.0046741232), (6.5649711575, -73.0046741232))
            Line((6.5649711575, -73.0046741232), (6.5649711575, -88.5696452806))
            ThreePointArc((6.5649711575, -88.5696452806), (20, -83.0046741232), (33.4350288425, -88.5696452806))
        make_face()
    extrude(amount=-F34_DEPTH)

    # F36 (on offset) → F37 (cut)
    with BuildSketch(Plane.XY.offset(379)):
        with Locations((20, -80.0046741232)):
            Rectangle(F36_W, F36_H)
    extrude(amount=-F37_DEPTH, mode=Mode.SUBTRACT)


with BuildPart() as f39:
    # F38 (on offset) → F39 (new body)
    with BuildSketch(Plane.XY.offset(379)):
        with BuildLine():
            Line((-46, -12.0046741232), (-50, -12.0046741232))
            ThreePointArc((-50, -12.0046741232), (-29.4974746831, -61.5021488063), (20, -82.0046741232))
            ThreePointArc((20, -82.0046741232), (69.4974746831, -61.5021488063), (90, -12.0046741232))
            Line((90, -12.0046741232), (86, -12.0046741232))
            ThreePointArc((86, -12.0046741232), (20, -78.0046741232), (-46, -12.0046741232))
        make_face()
    extrude(amount=-F39_DEPTH)


solid = Compound([f1.part, f8.part, f12.part, f14_1.part, f20_1.part, f26.part, f30.part, f34.part, f39.part])
